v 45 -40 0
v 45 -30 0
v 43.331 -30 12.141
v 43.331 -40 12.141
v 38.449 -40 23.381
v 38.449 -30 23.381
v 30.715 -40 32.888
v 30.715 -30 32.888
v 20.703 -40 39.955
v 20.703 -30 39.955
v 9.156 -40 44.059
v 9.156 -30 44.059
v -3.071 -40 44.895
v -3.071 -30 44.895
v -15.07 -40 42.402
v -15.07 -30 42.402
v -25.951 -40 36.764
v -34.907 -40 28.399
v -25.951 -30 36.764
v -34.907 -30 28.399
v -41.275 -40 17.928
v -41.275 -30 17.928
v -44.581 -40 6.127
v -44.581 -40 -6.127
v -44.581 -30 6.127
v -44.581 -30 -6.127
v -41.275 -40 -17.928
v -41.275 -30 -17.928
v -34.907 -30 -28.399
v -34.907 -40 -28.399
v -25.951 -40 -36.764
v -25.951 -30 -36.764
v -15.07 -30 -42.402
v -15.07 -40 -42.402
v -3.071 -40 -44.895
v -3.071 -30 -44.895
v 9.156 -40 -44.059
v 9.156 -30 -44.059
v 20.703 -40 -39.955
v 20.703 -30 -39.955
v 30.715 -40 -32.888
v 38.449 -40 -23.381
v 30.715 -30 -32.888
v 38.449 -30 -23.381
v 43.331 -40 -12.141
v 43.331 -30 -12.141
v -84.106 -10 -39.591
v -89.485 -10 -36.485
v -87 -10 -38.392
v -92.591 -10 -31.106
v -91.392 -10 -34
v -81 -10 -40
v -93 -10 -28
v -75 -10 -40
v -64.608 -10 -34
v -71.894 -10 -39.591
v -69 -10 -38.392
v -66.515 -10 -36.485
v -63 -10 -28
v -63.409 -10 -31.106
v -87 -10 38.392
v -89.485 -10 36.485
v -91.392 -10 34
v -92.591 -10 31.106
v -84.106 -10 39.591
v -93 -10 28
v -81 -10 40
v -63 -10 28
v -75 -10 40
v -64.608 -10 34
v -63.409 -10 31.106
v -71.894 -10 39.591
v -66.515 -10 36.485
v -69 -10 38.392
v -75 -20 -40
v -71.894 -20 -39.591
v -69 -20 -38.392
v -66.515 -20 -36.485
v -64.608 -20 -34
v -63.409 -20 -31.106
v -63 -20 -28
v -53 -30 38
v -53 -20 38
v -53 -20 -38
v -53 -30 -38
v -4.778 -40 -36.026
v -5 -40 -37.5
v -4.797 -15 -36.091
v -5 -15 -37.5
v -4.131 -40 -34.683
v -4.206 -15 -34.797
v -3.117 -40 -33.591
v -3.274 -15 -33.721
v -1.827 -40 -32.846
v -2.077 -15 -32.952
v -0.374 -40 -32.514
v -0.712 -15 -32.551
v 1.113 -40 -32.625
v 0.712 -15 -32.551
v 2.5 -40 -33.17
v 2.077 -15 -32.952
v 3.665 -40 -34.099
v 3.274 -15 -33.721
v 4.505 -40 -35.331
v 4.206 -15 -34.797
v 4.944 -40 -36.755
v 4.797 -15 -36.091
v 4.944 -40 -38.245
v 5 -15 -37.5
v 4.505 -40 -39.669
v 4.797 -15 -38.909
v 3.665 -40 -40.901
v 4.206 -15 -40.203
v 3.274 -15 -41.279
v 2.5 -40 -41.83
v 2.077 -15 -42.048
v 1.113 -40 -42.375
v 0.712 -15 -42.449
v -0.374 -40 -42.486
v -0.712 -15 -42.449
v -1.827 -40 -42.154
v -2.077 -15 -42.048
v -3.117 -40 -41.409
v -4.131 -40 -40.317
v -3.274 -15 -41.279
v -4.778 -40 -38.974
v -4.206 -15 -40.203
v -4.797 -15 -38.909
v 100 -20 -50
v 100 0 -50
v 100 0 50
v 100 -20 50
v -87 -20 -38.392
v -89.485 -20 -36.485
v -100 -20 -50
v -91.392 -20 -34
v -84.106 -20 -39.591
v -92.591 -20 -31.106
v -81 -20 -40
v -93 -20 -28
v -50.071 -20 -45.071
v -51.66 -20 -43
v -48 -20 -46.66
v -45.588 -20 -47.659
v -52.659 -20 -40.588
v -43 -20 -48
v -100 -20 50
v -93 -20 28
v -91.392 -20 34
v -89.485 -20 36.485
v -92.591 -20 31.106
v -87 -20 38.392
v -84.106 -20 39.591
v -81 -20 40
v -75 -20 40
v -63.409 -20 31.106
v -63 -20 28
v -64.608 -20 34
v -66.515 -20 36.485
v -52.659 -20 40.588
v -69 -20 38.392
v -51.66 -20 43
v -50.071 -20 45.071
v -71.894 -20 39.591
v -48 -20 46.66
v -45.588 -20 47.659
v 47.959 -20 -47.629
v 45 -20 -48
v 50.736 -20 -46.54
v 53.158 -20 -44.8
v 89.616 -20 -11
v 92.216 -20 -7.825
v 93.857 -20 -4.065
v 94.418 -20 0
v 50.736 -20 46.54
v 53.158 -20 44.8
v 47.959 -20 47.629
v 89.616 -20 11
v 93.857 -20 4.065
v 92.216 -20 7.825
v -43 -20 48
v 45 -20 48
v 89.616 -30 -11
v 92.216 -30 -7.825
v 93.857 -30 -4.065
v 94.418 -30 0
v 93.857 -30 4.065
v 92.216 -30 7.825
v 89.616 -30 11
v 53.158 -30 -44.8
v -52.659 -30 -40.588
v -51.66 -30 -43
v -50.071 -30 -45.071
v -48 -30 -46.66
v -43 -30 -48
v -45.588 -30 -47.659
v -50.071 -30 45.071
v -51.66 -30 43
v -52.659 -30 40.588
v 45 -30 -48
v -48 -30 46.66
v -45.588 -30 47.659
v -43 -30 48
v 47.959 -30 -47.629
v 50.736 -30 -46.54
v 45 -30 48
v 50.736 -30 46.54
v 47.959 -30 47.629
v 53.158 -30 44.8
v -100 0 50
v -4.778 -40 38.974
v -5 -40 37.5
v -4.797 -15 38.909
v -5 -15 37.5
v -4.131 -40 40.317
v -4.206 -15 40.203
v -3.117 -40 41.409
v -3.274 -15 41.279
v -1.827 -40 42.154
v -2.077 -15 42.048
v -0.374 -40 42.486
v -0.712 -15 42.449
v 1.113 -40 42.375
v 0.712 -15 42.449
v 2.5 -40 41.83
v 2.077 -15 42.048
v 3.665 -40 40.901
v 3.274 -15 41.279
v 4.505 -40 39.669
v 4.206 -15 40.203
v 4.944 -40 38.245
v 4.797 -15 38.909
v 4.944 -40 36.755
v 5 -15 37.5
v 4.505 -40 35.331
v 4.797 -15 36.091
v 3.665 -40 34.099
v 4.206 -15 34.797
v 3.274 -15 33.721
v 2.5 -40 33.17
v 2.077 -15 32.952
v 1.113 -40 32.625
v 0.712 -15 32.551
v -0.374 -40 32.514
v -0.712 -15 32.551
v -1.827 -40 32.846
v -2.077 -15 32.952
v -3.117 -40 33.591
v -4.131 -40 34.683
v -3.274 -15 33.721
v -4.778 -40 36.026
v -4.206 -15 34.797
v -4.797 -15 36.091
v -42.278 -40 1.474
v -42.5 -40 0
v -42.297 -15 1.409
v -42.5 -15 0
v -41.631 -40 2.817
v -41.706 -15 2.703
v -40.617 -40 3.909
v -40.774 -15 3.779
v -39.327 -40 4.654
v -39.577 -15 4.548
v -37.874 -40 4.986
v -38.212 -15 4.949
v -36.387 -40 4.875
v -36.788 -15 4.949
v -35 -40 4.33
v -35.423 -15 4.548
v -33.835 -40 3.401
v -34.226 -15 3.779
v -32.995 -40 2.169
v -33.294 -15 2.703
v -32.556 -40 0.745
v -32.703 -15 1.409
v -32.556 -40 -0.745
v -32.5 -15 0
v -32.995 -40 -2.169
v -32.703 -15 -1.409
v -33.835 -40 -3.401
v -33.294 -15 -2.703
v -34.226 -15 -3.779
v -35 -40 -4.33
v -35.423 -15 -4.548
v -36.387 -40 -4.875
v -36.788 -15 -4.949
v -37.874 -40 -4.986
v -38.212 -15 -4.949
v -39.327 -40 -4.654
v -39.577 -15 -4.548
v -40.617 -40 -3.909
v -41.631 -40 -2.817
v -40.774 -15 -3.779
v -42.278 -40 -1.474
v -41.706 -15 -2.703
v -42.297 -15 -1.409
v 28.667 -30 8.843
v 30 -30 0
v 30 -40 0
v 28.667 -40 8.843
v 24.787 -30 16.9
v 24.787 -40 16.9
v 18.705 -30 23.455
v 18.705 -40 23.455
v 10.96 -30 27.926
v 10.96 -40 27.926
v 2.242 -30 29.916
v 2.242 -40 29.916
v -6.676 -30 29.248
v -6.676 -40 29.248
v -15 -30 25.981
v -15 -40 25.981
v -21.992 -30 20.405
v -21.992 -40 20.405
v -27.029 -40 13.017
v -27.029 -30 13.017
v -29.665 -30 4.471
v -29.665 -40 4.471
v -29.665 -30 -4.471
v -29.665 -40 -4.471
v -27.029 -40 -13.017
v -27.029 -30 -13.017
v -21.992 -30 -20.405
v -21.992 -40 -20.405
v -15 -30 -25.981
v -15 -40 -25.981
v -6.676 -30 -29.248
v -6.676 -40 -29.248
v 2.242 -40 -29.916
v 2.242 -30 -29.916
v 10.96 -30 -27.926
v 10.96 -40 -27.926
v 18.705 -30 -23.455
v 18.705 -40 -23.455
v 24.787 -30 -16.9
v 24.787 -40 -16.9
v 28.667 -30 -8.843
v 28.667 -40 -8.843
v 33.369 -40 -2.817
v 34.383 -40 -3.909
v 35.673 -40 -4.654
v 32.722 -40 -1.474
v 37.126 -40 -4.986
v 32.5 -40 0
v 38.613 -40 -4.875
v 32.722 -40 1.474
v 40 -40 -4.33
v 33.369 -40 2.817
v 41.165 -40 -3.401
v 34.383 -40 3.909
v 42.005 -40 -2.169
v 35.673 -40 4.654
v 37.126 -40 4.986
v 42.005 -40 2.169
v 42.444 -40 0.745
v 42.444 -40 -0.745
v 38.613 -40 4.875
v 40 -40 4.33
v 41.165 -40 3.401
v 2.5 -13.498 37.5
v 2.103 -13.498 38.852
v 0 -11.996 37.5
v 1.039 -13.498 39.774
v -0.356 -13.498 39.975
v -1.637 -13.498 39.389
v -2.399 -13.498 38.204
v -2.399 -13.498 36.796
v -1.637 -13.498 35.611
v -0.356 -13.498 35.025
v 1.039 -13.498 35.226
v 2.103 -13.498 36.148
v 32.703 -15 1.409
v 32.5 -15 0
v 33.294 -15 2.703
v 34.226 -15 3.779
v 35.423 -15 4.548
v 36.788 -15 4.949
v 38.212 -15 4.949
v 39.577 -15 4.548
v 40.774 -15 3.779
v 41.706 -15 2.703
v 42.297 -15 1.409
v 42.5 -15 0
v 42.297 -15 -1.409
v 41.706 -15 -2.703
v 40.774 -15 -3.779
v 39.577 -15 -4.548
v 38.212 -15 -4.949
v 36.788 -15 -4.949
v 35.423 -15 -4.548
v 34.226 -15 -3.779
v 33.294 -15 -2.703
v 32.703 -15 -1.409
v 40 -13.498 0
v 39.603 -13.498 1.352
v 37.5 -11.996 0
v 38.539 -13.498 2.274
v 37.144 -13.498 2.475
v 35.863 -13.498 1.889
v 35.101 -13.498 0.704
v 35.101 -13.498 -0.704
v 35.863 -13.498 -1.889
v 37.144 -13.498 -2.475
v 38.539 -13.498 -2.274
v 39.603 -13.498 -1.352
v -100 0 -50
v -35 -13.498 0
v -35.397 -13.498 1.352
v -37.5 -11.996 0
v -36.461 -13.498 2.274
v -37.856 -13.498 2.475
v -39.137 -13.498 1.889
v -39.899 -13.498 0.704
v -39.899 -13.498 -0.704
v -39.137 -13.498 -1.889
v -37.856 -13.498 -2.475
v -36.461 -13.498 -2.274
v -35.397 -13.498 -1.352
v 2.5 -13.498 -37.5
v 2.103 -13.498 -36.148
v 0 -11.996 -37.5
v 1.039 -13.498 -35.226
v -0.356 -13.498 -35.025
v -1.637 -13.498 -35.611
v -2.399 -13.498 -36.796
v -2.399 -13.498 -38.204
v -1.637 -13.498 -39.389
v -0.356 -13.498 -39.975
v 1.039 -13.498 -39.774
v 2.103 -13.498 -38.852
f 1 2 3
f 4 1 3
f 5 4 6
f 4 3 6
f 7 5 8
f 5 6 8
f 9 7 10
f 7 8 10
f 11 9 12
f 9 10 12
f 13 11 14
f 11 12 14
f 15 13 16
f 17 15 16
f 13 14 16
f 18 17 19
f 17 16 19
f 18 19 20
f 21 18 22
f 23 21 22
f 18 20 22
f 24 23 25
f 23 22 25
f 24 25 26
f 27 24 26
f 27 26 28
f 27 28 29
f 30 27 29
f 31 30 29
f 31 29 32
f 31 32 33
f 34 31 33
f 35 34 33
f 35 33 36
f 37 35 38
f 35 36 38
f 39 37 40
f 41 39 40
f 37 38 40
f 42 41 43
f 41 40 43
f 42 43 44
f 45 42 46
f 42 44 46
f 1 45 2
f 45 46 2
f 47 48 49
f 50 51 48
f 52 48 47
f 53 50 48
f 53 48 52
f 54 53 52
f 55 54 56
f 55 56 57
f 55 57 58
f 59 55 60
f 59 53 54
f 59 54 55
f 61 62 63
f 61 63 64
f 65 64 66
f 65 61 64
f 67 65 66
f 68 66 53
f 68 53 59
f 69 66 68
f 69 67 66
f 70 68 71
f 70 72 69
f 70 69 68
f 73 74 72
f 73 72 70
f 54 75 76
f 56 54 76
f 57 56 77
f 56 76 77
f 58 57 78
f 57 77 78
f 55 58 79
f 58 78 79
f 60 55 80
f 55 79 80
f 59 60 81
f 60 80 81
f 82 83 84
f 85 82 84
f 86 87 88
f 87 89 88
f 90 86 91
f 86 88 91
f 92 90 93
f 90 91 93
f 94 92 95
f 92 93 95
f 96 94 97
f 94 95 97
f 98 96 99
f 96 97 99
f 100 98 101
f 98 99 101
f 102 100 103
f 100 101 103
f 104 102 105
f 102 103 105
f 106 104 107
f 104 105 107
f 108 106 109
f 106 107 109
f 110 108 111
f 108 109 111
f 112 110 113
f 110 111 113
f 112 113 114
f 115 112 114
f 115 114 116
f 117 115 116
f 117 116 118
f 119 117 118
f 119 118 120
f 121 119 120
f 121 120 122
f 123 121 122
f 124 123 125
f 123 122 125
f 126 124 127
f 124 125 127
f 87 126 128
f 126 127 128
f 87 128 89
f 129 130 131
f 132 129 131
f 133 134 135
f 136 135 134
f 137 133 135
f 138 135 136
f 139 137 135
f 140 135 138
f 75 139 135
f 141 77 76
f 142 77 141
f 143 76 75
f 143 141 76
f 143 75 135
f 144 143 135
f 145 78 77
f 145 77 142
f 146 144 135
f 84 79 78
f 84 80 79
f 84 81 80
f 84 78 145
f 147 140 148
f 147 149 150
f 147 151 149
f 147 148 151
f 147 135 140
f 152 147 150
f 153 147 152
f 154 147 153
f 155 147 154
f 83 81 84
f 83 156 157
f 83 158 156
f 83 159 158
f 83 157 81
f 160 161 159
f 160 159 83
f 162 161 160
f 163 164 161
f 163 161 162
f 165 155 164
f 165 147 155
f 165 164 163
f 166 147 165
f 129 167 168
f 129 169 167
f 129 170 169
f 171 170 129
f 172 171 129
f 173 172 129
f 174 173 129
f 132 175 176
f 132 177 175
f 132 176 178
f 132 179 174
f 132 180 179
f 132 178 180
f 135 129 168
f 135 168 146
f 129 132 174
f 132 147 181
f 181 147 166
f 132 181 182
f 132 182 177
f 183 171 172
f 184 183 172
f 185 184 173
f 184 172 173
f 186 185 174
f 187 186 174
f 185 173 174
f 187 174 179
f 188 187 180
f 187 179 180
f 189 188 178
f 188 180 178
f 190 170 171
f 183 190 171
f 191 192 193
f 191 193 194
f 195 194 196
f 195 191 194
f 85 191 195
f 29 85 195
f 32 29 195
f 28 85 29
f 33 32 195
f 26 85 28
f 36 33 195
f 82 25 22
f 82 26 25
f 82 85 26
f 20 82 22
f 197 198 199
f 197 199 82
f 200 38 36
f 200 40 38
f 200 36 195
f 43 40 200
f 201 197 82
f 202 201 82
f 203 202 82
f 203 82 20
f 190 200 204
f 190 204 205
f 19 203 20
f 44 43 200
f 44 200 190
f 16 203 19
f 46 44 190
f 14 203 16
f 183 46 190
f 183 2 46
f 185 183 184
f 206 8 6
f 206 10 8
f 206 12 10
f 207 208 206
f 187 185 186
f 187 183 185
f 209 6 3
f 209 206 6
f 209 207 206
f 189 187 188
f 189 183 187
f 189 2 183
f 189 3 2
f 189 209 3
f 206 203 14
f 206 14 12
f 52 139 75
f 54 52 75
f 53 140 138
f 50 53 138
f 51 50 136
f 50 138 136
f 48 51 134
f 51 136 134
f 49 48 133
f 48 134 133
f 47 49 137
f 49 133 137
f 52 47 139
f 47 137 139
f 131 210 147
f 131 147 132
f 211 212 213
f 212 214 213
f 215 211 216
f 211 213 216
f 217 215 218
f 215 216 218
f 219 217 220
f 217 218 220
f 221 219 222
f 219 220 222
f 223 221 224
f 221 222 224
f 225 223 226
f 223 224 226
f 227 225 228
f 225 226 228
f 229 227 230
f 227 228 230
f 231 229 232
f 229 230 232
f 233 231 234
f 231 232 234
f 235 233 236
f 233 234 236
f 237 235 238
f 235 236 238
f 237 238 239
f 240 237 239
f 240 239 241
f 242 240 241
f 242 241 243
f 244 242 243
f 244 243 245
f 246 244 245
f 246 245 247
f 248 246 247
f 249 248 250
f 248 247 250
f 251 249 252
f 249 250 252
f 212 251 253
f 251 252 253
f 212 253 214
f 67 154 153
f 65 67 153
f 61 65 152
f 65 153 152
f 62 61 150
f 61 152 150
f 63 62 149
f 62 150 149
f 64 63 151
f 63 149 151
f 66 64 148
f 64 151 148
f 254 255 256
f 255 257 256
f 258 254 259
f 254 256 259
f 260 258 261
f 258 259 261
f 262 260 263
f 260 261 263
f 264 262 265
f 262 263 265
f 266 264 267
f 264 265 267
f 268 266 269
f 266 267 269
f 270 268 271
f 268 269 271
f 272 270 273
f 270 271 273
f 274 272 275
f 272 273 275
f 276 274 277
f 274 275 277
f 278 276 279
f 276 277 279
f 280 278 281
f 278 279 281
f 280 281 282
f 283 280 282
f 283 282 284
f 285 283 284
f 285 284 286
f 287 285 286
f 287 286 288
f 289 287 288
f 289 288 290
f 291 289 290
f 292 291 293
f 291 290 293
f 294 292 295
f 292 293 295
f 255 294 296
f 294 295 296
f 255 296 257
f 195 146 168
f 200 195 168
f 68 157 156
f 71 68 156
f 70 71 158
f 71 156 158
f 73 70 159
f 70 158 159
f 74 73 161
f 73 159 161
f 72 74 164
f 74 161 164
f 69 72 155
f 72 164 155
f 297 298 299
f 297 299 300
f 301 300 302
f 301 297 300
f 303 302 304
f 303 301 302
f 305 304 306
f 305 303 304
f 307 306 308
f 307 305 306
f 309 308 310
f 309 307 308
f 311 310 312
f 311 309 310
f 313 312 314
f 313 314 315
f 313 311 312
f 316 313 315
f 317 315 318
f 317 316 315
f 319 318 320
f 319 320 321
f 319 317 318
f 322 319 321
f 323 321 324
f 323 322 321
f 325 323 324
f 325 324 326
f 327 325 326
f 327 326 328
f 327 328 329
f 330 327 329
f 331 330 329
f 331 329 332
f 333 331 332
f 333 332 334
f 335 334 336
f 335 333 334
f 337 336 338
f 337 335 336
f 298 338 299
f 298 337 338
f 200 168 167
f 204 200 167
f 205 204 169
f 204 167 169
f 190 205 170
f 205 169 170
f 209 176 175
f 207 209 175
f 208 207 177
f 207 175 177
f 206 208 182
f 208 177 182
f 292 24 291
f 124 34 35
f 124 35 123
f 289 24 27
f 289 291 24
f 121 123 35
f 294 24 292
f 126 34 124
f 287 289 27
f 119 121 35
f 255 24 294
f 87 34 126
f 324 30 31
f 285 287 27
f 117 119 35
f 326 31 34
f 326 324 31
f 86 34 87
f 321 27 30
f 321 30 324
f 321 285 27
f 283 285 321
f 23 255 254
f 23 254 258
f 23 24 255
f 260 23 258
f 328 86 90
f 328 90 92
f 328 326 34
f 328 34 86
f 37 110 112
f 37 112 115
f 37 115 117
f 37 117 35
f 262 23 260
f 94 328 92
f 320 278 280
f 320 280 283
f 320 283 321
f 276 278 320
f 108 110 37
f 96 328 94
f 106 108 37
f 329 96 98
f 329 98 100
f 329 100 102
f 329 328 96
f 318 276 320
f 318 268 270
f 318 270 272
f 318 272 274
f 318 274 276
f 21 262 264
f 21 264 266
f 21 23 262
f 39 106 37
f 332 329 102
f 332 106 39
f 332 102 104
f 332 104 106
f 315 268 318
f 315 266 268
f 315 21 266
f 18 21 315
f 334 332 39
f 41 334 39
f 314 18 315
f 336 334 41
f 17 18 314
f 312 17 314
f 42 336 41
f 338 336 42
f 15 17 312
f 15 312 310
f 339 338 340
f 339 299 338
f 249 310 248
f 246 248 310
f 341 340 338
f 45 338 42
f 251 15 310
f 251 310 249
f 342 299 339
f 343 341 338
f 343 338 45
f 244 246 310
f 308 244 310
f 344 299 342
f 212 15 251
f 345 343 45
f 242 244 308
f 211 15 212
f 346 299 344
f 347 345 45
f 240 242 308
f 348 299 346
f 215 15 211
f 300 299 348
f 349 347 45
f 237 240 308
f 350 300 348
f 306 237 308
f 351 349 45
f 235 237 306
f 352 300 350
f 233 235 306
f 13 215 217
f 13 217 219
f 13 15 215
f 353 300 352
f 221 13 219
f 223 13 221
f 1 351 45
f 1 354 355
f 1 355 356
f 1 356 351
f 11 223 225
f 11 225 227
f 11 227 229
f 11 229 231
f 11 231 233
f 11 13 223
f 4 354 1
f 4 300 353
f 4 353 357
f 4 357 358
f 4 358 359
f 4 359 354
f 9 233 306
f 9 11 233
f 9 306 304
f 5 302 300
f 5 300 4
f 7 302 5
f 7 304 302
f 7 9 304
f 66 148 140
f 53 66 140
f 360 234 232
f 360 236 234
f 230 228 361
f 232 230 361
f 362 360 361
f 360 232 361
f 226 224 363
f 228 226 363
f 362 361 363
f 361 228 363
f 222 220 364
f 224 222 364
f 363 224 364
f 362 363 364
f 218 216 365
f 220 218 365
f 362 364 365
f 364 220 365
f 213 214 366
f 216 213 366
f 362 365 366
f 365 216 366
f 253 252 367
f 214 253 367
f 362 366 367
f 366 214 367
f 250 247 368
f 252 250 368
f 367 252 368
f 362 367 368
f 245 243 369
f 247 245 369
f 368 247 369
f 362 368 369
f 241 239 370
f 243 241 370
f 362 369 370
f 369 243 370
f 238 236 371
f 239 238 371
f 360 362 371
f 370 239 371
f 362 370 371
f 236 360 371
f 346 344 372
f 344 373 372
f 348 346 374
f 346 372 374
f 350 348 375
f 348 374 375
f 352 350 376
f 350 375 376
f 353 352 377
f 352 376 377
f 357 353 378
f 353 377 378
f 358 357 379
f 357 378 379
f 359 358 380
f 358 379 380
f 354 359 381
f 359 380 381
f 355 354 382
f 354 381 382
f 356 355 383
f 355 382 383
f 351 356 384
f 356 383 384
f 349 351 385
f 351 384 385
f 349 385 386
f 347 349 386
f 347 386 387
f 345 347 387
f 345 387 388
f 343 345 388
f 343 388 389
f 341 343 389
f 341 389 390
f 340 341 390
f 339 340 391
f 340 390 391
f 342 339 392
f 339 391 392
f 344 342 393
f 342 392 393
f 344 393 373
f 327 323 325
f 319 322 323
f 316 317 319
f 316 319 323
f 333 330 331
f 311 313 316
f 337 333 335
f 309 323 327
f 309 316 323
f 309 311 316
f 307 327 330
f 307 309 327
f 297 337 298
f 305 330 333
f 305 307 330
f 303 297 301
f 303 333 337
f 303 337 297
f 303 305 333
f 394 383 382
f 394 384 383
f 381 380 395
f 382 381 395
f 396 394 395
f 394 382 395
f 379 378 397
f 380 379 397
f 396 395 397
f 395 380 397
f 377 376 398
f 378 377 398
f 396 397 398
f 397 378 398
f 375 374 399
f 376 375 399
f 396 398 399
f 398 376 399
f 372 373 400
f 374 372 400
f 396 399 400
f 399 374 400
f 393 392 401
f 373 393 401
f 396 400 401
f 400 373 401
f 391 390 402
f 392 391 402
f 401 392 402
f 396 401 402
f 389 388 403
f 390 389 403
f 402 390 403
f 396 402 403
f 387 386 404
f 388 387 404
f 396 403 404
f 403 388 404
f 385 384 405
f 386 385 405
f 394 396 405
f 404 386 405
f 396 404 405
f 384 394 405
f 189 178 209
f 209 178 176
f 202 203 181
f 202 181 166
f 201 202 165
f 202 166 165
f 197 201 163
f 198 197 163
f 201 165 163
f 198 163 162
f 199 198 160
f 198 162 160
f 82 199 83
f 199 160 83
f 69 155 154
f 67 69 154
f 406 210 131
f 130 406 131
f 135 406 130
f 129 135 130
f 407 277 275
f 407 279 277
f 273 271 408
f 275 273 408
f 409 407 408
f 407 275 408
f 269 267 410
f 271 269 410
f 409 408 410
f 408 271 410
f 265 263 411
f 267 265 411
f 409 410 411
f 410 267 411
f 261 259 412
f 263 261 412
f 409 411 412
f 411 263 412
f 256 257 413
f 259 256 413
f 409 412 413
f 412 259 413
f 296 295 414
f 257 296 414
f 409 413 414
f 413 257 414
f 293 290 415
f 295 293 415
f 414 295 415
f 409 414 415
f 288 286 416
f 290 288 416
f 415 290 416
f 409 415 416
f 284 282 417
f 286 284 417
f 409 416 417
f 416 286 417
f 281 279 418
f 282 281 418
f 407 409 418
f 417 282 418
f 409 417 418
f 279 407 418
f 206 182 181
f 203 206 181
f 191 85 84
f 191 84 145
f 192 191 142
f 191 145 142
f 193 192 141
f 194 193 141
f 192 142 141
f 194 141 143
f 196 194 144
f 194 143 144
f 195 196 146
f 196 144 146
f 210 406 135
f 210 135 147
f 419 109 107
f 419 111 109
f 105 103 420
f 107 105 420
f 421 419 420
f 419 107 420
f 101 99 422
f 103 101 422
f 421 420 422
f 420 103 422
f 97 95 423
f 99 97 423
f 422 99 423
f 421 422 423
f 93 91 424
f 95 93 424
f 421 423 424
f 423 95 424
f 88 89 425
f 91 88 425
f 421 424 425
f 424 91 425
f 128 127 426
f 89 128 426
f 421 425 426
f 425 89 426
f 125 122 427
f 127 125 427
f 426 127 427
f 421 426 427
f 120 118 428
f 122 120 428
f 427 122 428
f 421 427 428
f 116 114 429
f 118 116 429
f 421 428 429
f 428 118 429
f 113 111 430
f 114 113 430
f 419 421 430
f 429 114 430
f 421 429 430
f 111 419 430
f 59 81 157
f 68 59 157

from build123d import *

# Parameters (mm, degrees)
F0_W     = 200
F0_H     = 100
F1_DEPTH = 20
F3_DEPTH = 10
F5_DEPTH = 10
F6_R     = 45
F6_R_2   = 30
F7_DEPTH = 10
F9_D     = 10
F9_DEPTH = 25
F9_TIP   = 3.0043030951


with BuildPart() as f1:
    # F0 (on Front) → F1 (new body)
    with BuildSketch(Plane.XZ):
        Rectangle(F0_W, F0_H)
    extrude(amount=F1_DEPTH)

    # F2 (on face) → F3 (cut)
    with BuildSketch(Plane.XZ.offset(20)):
        with BuildLine():
            Line((-81, -40), (-75, -40))
            ThreePointArc((-75, -40), (-66.5147186258, -36.4852813742), (-63, -28))
            Line((-63, -28), (-63, 28))
            ThreePointArc((-63, 28), (-66.5147186258, 36.4852813742), (-75, 40))
            Line((-75, 40), (-81, 40))
            ThreePointArc((-81, 40), (-89.4852813742, 36.4852813742), (-93, 28))
            Line((-93, 28), (-93, -28))
            ThreePointArc((-93, -28), (-89.4852813742, -36.4852813742), (-81, -40))
        make_face()
    extrude(amount=-F3_DEPTH, mode=Mode.SUBTRACT)

    # F4 (on face) → F5 (join)
    with BuildSketch(Plane.XZ.offset(20)):
        with BuildLine():
            ThreePointArc((-43, 48), (-50.0710678119, 45.0710678119), (-53, 38))
            Line((-53, 38), (-53, -38))
            ThreePointArc((-53, -38), (-50.0710678119, -45.0710678119), (-43, -48))
            Line((-43, -48), (45, -48))
            ThreePointArc((45, -48), (49.38178046, -47.171392035), (53.1584312217, -44.8))
            Line((53.1584312217, -44.8), (89.6164207439, -11))
            ThreePointArc((89.6164207439, -11), (94.4183817168, 0), (89.6164207439, 11))
            Line((89.6164207439, 11), (53.1584312217, 44.8))
            ThreePointArc((53.1584312217, 44.8), (49.38178046, 47.171392035), (45, 48))
            Line((45, 48), (-43, 48))
        make_face()
    extrude(amount=F5_DEPTH)

    # F6 (on face) → F7 (join)
    with BuildSketch(Plane.XZ.offset(30)):
        Circle(F6_R)
        Circle(F6_R_2, mode=Mode.SUBTRACT)
    extrude(amount=F7_DEPTH)

    # F9
    with Locations(Plane.XZ.offset(40)):
        with Locations((-37.5, 0), (0, 37.5), (37.5, 0), (0, -37.5)):
            Hole(F9_D / 2, depth=F9_DEPTH)
            with Locations((0, 0, -(F9_DEPTH + F9_TIP / 2))):  # 118° drill point
                Cone(0, F9_D / 2, F9_TIP, mode=Mode.SUBTRACT)


solid = f1.part
